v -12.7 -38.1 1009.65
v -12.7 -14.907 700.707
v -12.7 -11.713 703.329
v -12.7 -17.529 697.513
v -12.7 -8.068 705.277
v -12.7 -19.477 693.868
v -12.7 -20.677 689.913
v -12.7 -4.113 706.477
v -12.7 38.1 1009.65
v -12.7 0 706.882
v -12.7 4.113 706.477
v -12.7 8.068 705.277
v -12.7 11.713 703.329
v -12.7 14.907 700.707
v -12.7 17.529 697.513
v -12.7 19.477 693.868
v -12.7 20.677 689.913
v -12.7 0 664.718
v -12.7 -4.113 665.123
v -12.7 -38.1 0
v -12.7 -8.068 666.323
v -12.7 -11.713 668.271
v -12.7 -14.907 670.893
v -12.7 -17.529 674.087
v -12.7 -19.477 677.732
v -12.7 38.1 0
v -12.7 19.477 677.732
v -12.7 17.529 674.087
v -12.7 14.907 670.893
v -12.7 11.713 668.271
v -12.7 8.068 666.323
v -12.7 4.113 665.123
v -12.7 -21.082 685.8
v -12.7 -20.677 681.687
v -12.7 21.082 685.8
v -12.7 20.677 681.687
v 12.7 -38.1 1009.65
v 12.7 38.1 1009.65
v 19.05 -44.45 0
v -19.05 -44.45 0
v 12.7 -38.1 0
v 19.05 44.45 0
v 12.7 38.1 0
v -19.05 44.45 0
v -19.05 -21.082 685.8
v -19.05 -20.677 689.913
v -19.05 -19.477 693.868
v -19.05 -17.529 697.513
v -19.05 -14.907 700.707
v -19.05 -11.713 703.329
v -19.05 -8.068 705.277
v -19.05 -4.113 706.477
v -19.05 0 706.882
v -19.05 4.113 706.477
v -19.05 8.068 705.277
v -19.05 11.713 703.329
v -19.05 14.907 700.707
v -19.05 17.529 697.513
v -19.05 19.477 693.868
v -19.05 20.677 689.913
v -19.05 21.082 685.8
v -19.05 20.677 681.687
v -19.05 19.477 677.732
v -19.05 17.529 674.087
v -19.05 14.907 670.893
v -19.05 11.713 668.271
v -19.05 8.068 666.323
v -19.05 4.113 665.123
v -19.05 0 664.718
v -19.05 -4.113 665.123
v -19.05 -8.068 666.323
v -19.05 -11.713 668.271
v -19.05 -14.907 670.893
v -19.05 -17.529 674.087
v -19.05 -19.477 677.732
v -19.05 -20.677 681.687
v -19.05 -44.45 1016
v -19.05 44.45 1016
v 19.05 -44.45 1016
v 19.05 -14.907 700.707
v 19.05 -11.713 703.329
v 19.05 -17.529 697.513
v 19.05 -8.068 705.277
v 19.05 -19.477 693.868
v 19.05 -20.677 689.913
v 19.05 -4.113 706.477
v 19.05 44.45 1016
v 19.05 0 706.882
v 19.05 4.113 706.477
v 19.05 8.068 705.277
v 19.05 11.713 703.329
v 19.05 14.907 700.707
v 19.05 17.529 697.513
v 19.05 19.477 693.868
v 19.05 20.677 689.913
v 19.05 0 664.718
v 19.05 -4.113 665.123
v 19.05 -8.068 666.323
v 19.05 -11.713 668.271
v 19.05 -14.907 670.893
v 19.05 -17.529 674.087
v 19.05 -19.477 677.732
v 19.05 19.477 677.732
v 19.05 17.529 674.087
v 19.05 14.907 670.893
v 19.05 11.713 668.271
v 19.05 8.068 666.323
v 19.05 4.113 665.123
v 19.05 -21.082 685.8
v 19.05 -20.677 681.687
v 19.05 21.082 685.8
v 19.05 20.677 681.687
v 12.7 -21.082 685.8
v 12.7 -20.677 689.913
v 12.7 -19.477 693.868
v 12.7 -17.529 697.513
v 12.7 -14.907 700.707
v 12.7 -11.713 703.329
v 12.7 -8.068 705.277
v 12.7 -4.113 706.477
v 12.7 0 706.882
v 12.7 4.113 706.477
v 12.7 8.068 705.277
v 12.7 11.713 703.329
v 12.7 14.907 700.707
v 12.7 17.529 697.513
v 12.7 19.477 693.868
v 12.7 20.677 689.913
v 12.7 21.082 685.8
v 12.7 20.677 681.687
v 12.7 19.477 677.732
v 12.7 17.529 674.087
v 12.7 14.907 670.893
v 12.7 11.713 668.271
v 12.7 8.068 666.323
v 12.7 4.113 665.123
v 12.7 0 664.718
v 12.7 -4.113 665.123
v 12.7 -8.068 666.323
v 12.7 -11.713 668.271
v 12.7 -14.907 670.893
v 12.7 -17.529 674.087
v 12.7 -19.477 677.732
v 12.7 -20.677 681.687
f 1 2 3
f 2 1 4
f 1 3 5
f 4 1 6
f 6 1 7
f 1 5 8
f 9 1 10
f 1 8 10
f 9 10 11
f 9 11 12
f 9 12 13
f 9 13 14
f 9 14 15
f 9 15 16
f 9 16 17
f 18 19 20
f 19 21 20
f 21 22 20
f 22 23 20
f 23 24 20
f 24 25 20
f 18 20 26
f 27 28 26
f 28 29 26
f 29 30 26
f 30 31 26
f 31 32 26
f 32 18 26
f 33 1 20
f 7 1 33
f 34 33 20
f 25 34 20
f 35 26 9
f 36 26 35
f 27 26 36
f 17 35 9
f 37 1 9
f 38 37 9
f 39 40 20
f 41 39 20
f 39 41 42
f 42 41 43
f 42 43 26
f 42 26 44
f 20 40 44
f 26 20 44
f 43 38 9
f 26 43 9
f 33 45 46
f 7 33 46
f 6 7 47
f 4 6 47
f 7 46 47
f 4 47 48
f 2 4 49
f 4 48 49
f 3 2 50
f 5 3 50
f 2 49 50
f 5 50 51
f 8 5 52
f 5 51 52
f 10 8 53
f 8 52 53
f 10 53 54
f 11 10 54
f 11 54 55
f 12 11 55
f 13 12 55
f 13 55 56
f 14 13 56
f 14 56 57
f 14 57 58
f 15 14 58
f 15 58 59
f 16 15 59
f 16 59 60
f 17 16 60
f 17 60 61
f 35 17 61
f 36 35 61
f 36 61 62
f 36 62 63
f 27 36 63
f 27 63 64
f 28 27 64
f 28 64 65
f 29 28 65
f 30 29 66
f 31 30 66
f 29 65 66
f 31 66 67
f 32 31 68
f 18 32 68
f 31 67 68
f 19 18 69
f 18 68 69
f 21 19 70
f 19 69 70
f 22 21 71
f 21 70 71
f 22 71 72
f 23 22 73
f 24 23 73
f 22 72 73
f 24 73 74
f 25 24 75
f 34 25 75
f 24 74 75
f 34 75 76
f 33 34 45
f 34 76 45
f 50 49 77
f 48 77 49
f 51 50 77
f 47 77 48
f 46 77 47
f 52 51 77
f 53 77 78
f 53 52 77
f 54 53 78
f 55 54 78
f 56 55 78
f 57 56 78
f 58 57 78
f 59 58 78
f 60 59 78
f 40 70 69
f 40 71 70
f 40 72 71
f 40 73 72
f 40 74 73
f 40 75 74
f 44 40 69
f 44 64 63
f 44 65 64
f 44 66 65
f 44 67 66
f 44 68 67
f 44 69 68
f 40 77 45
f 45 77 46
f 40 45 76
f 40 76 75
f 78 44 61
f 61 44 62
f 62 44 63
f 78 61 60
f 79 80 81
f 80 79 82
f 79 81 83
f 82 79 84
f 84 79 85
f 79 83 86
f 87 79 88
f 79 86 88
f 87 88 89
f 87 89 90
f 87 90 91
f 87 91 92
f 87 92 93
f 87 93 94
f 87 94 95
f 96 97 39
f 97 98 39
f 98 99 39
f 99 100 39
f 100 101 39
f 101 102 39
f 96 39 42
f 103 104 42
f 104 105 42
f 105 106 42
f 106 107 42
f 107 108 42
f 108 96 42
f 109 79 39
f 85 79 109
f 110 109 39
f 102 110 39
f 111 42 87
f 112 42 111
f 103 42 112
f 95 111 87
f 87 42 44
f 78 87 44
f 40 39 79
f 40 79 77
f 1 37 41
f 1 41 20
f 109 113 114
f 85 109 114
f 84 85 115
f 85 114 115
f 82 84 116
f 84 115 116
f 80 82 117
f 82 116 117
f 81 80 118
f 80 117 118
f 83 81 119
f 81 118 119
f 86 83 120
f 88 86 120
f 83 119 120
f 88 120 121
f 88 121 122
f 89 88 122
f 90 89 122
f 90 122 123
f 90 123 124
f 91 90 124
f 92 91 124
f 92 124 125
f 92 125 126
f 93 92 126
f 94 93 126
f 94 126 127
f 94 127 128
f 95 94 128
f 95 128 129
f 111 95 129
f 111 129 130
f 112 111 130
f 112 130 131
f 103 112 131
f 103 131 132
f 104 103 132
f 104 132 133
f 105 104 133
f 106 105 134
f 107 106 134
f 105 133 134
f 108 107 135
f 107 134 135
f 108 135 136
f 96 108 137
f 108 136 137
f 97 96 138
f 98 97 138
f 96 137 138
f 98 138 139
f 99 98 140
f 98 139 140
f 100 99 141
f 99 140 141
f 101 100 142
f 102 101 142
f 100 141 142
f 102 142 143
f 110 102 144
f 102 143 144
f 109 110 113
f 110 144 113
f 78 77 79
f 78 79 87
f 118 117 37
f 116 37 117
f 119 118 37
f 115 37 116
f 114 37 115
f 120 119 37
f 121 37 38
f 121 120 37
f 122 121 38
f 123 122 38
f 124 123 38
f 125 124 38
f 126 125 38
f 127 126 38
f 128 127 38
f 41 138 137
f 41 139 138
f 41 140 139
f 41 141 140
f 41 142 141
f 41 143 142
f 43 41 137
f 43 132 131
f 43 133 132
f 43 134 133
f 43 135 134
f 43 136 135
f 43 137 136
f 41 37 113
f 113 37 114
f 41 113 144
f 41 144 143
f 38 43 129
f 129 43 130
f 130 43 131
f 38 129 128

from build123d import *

# Parameters (mm, degrees)
SKETCH1_W                    = 88.9
SKETCH1_H                    = 38.1
BOSS_EXTRUDE1_DEPTH          = 1016
SHELL1_T                     = -6.35
F_5_16_1_66_DIAMETER_HOLE1_D = 42.164


with BuildPart() as part:
    # Sketch1 → Boss-Extrude1 (new body)
    with BuildSketch(Plane(origin=(0, 0, 0), x_dir=(0, 1, 0), z_dir=(0, 0, 1))):
        Rectangle(SKETCH1_W, SKETCH1_H)
    extrude(amount=BOSS_EXTRUDE1_DEPTH)

    # Shell1
    shell1_openings = [part.faces().sort_by_distance(p)[0] for p in [
        (0, 0, 0),
    ]]
    offset(amount=SHELL1_T, openings=shell1_openings, kind=Kind.INTERSECTION)

    # 5/16 (1.66) Diameter Hole1 (through all)
    with Locations(Plane.YZ.offset(19.05)):
        with Locations((0, 685.8)):
            Hole(F_5_16_1_66_DIAMETER_HOLE1_D / 2)


solid = part.part
